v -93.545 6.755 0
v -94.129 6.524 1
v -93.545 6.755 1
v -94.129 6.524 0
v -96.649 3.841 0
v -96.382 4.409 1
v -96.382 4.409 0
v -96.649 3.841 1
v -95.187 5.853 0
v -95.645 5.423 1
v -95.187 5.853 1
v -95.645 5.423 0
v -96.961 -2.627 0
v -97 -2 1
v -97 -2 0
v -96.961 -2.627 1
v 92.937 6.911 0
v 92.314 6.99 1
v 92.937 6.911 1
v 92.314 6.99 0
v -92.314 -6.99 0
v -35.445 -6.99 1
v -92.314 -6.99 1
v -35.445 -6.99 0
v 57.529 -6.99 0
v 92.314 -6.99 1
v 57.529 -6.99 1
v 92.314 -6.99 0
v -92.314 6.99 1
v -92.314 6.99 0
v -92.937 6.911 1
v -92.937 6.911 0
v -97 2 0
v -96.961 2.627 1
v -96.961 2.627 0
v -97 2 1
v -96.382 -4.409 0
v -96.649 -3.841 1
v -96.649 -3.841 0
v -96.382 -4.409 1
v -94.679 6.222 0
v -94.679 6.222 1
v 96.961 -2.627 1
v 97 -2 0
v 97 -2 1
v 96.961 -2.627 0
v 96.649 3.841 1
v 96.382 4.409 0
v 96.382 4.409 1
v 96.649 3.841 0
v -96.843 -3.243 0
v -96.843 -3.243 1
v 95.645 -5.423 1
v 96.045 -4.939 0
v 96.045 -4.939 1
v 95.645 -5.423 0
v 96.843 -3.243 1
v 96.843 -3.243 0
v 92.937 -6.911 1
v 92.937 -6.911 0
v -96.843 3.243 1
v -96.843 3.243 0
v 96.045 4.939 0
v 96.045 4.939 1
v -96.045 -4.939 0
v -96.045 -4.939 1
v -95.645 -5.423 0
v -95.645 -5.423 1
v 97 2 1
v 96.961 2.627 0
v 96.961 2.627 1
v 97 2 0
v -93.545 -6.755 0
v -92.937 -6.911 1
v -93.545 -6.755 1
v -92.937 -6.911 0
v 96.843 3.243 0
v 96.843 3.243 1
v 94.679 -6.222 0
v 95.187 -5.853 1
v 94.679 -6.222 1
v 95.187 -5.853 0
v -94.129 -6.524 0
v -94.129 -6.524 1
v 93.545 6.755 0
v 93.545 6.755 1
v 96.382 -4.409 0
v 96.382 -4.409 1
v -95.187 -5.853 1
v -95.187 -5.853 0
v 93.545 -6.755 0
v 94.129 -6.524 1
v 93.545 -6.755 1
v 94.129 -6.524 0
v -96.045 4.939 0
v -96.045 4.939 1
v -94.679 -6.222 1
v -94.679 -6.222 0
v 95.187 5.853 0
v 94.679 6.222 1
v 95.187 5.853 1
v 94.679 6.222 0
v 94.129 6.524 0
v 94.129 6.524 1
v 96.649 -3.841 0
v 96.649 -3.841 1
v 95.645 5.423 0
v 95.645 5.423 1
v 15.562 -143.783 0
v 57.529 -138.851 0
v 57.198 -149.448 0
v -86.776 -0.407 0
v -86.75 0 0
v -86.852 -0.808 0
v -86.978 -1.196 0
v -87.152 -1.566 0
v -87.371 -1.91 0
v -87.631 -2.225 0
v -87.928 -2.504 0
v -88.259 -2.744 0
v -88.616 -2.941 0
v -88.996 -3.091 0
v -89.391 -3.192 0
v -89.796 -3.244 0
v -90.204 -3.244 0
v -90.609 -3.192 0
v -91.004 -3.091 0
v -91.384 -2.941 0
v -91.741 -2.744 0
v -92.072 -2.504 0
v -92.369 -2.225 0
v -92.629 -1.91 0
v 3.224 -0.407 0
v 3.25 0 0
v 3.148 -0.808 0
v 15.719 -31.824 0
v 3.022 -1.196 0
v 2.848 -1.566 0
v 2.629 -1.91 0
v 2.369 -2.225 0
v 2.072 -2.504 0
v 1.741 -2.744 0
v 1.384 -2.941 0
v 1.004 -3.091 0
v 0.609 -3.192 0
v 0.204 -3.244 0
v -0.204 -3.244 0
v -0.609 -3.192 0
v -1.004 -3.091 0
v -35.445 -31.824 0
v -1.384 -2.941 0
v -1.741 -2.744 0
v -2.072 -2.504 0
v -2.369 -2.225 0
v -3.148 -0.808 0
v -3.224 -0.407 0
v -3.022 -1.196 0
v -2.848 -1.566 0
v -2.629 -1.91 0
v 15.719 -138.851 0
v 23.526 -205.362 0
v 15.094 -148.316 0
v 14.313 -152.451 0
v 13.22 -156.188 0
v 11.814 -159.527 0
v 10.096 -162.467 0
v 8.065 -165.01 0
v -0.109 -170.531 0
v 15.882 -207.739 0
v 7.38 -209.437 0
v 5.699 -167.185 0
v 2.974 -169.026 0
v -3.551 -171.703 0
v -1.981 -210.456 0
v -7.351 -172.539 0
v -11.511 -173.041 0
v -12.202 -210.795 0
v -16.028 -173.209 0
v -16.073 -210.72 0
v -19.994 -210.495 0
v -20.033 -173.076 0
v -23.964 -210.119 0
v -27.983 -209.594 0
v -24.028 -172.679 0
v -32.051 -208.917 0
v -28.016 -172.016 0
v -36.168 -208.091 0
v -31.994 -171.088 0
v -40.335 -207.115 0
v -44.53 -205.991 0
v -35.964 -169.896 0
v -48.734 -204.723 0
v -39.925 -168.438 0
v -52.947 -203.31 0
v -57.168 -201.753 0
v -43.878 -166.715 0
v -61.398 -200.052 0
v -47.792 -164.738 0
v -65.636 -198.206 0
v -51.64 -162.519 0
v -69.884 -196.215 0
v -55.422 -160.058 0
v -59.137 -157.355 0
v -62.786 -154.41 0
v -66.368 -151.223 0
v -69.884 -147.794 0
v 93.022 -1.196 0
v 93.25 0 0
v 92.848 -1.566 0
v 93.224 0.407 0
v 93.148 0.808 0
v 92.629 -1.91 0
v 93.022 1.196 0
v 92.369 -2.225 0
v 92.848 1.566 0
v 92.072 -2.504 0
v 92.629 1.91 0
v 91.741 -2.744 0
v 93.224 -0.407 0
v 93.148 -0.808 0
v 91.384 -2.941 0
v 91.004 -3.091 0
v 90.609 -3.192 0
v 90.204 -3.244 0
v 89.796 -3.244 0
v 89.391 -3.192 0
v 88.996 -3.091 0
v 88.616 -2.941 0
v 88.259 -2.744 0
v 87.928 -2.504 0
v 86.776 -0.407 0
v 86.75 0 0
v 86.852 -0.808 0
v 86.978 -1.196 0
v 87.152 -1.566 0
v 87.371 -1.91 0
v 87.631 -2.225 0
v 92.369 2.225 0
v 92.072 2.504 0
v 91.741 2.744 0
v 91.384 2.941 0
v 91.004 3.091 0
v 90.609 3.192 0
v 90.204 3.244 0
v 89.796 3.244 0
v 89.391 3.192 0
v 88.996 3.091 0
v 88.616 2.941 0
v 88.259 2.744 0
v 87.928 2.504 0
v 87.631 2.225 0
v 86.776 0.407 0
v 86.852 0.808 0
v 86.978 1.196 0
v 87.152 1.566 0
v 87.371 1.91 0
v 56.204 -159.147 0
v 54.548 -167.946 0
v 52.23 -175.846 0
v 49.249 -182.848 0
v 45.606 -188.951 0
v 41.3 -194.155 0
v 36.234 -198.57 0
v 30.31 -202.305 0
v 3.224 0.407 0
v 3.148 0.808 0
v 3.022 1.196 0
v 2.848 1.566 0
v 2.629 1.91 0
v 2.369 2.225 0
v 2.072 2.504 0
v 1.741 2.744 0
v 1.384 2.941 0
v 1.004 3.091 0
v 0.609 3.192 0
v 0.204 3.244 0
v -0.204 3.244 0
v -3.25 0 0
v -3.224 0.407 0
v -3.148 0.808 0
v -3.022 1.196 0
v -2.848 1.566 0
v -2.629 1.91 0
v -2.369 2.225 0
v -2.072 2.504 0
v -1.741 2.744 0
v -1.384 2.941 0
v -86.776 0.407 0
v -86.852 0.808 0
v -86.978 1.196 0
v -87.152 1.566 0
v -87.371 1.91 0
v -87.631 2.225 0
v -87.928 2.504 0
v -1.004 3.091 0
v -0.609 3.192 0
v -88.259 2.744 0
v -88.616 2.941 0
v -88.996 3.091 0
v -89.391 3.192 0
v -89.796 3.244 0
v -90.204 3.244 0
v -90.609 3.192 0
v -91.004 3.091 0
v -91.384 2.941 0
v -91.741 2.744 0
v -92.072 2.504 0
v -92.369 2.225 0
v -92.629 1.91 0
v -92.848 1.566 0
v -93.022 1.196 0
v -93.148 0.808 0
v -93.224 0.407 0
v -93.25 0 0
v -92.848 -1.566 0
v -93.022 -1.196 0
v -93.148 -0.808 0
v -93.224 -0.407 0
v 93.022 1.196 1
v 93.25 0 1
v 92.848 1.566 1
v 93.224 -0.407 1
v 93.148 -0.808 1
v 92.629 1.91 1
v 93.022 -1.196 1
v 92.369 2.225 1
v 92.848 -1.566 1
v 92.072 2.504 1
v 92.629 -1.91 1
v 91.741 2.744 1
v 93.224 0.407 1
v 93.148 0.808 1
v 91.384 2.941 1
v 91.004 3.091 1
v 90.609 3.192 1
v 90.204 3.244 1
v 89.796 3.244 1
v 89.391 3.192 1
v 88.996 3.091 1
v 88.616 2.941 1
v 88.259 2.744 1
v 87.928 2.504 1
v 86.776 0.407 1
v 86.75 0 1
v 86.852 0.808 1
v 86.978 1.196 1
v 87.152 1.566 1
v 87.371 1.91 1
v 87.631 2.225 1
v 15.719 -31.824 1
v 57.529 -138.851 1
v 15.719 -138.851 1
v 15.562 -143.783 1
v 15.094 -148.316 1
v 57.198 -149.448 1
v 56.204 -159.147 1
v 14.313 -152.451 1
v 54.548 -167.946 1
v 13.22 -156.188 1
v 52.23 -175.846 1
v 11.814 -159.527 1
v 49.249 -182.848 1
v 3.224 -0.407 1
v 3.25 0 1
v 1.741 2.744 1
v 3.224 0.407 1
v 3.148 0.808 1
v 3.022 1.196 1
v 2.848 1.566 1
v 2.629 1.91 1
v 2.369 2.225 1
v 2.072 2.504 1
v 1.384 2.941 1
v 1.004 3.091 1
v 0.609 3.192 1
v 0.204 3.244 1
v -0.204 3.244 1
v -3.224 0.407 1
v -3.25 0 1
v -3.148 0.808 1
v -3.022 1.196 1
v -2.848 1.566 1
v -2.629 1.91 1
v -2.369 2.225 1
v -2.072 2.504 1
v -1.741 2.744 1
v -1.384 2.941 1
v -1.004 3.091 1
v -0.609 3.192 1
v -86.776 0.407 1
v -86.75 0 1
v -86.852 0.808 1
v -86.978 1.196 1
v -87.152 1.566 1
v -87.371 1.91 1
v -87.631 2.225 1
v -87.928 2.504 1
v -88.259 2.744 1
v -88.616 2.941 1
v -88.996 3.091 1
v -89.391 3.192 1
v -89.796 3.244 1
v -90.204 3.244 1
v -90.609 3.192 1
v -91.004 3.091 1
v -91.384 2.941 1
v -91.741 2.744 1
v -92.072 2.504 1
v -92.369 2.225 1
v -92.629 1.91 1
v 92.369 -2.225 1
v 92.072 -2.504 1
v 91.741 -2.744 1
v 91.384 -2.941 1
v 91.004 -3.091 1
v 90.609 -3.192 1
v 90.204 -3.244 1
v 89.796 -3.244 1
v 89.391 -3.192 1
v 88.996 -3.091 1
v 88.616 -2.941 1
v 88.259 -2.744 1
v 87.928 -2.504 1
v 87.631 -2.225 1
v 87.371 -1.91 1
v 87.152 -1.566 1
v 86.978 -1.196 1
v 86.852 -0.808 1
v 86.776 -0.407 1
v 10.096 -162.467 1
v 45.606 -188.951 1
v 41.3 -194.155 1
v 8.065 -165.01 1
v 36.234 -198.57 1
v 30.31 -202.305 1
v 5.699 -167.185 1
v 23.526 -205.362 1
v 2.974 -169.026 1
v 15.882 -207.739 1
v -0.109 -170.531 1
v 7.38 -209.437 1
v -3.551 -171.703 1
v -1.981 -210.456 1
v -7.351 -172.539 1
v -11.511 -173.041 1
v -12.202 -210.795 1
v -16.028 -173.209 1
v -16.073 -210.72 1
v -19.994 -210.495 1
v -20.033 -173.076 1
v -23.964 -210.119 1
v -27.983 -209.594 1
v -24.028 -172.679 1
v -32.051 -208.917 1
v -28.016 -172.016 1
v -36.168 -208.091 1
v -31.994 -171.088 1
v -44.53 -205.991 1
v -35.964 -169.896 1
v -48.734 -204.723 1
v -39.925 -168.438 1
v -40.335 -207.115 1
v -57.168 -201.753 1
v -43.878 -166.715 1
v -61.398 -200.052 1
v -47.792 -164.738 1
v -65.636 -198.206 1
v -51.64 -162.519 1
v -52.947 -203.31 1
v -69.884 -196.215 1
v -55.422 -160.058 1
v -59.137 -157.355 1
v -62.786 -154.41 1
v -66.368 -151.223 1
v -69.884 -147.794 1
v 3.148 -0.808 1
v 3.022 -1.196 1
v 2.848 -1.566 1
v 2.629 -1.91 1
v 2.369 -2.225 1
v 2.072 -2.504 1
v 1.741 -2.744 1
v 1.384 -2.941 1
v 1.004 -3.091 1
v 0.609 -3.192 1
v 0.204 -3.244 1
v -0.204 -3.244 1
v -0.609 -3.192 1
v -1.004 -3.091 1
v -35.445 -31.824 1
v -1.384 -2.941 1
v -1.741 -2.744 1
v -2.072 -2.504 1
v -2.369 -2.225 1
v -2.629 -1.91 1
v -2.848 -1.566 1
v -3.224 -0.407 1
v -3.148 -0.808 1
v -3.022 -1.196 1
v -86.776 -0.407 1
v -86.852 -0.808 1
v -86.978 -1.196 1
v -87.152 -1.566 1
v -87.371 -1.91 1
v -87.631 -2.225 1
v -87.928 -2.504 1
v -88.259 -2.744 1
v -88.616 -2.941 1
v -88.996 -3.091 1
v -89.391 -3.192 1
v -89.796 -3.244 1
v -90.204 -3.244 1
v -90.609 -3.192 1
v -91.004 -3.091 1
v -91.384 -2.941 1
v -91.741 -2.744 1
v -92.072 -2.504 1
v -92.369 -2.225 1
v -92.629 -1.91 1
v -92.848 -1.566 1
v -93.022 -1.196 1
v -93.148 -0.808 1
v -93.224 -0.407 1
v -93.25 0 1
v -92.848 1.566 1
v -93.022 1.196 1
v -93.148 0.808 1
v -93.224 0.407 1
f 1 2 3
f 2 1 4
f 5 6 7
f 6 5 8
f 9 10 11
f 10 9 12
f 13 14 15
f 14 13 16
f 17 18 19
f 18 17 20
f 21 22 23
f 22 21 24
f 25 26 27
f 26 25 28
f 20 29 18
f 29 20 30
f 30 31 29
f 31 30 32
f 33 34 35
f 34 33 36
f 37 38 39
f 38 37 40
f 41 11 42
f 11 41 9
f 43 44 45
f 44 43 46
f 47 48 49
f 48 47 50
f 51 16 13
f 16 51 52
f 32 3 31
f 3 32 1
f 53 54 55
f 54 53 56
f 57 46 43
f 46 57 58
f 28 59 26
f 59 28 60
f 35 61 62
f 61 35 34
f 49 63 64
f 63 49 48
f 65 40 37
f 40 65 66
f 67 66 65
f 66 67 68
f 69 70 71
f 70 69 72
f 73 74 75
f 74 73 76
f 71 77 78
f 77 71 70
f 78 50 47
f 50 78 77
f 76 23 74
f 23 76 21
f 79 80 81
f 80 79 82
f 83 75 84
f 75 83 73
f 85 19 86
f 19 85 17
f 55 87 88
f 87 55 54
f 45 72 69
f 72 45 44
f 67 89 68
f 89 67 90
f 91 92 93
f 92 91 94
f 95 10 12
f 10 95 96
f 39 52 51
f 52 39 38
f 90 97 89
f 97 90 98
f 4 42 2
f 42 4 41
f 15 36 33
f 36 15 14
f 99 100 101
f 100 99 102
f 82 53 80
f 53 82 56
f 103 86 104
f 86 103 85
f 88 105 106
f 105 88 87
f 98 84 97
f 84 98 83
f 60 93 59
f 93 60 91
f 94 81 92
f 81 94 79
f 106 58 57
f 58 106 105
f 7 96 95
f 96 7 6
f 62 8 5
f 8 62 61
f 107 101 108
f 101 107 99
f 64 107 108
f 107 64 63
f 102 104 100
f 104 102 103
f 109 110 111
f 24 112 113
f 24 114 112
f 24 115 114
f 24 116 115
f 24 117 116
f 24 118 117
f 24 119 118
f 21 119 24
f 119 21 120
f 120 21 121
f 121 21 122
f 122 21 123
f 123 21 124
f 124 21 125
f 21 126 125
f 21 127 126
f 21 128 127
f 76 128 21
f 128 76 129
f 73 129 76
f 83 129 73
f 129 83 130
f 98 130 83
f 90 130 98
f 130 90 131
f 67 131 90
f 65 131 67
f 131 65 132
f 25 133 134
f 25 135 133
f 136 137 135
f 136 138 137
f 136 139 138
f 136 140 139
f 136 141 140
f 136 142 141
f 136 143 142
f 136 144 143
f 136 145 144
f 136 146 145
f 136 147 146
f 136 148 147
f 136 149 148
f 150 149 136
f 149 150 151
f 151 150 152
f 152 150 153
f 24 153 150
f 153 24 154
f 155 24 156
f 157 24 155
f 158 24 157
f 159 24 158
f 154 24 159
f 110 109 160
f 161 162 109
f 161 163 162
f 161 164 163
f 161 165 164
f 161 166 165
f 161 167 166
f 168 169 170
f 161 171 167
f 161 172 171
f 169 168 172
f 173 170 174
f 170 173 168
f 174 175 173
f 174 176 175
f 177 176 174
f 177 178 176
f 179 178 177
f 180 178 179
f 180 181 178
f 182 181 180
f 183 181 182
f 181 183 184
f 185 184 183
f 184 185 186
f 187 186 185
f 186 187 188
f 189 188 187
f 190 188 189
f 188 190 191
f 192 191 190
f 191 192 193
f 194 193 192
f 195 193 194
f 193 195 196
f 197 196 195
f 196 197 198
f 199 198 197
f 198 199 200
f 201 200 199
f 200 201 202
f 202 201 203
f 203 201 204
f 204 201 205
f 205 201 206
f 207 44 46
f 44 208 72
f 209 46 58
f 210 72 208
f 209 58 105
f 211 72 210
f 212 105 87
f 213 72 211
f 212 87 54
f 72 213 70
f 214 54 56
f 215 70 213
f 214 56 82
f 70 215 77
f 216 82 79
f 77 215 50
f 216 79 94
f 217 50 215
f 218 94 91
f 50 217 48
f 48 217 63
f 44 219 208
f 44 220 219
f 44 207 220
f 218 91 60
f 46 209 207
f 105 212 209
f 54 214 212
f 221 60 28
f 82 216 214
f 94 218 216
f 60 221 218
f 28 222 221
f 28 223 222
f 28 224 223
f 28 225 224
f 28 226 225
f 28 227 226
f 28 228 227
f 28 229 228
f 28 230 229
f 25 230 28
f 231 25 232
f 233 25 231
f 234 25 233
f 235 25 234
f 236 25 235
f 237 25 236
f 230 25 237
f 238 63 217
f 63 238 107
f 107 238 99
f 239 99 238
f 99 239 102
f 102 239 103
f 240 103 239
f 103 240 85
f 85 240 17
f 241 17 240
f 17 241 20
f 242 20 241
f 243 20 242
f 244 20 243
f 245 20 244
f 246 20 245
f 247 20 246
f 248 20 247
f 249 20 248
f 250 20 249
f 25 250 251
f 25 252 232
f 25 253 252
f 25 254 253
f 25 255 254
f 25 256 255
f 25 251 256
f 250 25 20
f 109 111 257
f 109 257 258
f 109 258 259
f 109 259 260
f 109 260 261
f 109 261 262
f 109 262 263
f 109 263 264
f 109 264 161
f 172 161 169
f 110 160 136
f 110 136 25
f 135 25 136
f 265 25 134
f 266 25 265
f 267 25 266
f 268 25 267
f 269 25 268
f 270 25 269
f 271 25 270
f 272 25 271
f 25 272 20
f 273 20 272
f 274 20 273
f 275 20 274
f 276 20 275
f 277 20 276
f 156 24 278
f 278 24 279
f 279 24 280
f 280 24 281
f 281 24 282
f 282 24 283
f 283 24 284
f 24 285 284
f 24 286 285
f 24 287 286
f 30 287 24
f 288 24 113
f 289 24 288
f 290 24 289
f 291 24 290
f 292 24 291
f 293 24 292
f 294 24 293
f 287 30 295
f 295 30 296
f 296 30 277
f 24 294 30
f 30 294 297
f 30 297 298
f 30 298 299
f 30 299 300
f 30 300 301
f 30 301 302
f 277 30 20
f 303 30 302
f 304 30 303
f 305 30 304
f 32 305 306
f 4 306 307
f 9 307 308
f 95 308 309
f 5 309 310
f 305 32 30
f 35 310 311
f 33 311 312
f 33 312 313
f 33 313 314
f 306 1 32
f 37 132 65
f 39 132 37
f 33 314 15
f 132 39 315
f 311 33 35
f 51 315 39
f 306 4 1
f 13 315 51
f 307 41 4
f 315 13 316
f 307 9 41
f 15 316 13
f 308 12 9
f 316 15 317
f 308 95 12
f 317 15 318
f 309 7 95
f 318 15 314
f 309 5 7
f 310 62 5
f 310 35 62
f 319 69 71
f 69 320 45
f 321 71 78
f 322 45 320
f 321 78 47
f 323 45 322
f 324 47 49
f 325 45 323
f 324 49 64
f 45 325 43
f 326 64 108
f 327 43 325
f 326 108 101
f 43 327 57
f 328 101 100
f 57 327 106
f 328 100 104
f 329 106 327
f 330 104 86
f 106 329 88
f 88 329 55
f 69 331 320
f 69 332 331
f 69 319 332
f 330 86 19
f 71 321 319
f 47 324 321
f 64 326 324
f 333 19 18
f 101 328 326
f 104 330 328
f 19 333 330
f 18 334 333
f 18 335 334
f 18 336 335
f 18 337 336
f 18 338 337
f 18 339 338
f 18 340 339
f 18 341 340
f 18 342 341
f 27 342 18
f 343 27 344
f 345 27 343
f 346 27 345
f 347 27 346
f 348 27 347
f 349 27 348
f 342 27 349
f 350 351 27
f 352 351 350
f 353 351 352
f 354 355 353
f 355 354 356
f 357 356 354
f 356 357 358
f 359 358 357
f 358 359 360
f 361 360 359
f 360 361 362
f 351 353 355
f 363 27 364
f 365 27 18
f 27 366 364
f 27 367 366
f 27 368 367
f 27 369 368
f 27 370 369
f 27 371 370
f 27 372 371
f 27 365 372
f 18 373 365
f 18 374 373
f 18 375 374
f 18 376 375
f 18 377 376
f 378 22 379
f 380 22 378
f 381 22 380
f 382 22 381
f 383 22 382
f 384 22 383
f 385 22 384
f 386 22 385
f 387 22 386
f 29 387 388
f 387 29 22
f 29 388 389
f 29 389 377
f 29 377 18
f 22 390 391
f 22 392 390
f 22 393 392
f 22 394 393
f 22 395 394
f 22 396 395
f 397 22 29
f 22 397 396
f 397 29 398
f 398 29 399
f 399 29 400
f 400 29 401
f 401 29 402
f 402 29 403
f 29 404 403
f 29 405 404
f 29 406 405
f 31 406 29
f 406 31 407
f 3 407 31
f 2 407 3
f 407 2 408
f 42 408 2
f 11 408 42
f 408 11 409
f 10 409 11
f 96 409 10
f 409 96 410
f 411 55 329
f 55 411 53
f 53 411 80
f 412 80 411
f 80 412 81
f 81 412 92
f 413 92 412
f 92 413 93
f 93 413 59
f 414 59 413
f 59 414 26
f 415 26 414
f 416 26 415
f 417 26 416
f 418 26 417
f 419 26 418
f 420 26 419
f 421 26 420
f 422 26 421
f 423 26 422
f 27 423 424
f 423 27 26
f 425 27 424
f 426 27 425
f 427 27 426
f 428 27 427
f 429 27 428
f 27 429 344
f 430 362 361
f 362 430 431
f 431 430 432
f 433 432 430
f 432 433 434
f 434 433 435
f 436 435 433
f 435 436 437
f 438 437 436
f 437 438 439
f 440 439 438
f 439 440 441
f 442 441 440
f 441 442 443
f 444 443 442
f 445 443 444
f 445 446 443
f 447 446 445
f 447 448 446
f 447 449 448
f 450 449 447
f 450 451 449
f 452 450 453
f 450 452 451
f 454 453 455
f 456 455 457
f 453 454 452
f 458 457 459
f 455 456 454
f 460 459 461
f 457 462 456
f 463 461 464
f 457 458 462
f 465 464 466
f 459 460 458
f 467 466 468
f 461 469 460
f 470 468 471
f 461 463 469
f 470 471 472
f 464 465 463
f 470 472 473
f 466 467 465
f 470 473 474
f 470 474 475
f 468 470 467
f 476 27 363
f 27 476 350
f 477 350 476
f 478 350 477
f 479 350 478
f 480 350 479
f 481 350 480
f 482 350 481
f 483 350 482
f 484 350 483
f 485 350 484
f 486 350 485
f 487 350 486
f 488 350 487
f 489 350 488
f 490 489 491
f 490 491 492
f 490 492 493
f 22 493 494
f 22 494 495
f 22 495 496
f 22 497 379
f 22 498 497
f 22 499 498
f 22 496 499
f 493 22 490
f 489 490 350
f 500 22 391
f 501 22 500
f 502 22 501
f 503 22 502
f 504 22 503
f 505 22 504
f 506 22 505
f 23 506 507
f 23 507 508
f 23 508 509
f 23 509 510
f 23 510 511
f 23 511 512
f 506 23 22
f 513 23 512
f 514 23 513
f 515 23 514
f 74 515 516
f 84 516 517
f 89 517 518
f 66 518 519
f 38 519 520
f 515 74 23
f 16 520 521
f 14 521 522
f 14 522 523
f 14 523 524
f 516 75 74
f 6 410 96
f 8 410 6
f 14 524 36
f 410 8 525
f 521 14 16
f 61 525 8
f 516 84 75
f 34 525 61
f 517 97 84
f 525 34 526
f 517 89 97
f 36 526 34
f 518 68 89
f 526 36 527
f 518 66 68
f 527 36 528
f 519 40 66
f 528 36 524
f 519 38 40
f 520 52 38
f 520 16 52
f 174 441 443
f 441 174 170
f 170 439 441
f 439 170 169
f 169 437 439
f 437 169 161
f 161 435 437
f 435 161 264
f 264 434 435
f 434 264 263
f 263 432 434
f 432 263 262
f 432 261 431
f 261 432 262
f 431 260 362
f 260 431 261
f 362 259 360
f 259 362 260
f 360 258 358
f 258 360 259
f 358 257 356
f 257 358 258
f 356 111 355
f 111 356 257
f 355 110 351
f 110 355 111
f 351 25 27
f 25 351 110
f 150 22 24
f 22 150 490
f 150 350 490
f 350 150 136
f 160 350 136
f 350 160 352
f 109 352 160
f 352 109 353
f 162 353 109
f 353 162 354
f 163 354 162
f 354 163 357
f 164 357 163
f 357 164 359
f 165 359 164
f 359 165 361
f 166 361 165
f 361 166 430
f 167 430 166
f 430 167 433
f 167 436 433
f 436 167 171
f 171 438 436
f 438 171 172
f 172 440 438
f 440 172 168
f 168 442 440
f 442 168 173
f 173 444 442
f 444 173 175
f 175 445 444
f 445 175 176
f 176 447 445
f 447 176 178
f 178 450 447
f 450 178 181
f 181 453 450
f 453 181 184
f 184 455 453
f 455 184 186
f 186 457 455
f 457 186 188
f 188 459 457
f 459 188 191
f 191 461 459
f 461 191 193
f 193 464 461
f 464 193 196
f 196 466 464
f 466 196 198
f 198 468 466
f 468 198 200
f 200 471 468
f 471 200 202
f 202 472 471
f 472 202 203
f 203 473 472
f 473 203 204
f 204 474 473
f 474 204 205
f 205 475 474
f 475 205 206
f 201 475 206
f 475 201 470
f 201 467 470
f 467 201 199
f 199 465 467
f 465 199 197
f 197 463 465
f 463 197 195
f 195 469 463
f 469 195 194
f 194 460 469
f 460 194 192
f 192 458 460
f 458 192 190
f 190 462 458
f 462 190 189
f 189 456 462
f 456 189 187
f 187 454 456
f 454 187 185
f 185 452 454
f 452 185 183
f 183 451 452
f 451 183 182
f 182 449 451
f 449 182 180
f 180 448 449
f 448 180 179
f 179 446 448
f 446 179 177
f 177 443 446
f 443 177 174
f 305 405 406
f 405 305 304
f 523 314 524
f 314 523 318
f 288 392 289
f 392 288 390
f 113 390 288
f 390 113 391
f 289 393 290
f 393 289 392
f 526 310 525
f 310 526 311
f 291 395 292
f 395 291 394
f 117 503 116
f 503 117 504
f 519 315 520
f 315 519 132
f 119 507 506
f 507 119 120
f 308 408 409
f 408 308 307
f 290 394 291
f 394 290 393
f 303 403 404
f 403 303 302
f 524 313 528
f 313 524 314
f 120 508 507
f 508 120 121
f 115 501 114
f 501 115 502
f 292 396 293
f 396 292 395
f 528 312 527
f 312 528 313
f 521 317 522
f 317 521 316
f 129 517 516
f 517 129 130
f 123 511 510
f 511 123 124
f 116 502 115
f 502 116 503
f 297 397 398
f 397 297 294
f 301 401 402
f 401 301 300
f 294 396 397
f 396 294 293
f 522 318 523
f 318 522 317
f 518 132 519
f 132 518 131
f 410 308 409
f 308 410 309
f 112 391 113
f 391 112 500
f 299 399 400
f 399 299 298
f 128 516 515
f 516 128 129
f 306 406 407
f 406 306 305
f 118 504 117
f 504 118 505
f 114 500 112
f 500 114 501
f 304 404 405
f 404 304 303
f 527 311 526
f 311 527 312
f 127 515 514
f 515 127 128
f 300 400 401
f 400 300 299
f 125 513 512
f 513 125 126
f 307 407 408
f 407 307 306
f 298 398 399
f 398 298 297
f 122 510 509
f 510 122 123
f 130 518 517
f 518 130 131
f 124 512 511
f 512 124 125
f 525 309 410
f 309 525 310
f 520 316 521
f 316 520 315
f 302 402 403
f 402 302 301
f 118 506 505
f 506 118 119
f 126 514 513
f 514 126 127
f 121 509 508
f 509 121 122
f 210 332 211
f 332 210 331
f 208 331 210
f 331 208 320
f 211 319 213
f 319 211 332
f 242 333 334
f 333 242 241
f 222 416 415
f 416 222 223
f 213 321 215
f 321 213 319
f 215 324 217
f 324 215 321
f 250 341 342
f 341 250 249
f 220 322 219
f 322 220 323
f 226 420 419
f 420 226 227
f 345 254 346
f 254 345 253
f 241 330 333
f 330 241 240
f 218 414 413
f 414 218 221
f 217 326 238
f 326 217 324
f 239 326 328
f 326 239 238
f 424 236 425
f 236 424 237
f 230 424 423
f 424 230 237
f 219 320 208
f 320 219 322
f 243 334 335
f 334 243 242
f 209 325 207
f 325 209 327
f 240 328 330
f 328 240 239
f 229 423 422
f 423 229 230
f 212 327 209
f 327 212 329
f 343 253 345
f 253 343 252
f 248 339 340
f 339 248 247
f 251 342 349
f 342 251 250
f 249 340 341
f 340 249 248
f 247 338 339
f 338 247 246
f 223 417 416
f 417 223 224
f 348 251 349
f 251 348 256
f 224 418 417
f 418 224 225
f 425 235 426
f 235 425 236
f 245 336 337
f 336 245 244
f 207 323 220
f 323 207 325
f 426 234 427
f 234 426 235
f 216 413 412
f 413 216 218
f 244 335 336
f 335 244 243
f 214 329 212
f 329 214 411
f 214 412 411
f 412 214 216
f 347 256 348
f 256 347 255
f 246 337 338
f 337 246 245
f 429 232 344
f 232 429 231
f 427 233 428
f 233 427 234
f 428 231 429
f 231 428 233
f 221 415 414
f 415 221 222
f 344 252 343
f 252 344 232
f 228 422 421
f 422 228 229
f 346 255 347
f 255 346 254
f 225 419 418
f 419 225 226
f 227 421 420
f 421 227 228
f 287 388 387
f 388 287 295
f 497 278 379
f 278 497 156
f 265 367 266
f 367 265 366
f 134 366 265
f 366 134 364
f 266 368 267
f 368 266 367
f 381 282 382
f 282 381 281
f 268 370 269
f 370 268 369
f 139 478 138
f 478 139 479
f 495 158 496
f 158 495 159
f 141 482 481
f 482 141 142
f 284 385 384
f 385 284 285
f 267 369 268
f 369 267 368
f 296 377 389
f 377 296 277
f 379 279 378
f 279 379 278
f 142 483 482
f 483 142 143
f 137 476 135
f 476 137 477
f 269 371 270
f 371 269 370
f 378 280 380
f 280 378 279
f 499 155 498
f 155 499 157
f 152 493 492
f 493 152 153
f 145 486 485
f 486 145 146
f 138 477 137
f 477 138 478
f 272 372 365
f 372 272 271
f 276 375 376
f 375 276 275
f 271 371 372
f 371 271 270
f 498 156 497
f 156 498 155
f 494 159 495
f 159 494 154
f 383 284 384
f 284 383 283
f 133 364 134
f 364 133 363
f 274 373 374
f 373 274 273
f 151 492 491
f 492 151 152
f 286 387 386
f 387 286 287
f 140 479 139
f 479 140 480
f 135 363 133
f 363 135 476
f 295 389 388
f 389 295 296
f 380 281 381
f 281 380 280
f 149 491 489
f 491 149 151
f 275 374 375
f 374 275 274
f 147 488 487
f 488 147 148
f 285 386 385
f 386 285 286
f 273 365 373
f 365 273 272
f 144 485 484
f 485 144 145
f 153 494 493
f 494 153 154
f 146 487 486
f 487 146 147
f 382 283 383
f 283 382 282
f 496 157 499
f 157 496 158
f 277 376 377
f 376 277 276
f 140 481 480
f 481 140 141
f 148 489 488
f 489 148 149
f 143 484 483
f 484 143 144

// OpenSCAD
$fn = 50;


difference() {
	union() {
		translate(v = [0, 0, 0]) {
			rotate(a = [0, 0, 0]) {
				hull() {
					translate(v = [-92.0000000000, 2.0000000000, 0]) {
						rotate(a = [0, 0, 0]) {
							translate(v = [0, 0, 0]) {
								rotate(a = [0, 0, 0]) {
									cylinder(h = 1, r = 5);
								}
							}
						}
					}
					translate(v = [92.0000000000, 2.0000000000, 0]) {
						rotate(a = [0, 0, 0]) {
							translate(v = [0, 0, 0]) {
								rotate(a = [0, 0, 0]) {
									cylinder(h = 1, r = 5);
								}
							}
						}
					}
					translate(v = [-92.0000000000, -2.0000000000, 0]) {
						rotate(a = [0, 0, 0]) {
							translate(v = [0, 0, 0]) {
								rotate(a = [0, 0, 0]) {
									cylinder(h = 1, r = 5);
								}
							}
						}
					}
					translate(v = [92.0000000000, -2.0000000000, 0]) {
						rotate(a = [0, 0, 0]) {
							translate(v = [0, 0, 0]) {
								rotate(a = [0, 0, 0]) {
									cylinder(h = 1, r = 5);
								}
							}
						}
					}
				}
			}
		}
		translate(v = [0, 0, 0]) {
			rotate(a = [0, 0, 0]) {
				linear_extrude(height = 1) {
					text(font = "DejaVu Sans Mono:style=Bold", halign = "center", size = 209.0000000000, text = "J", valign = "top");
				}
			}
		}
	}
	union() {
		translate(v = [-90.0000000000, 0.0000000000, -125.0000000000]) {
			rotate(a = [0, 0, 0]) {
				cylinder(h = 250, r = 3.2500000000);
			}
		}
		translate(v = [90.0000000000, 0.0000000000, -125.0000000000]) {
			rotate(a = [0, 0, 0]) {
				cylinder(h = 250, r = 3.2500000000);
			}
		}
		translate(v = [90.0000000000, 0.0000000000, -125.0000000000]) {
			rotate(a = [0, 0, 0]) {
				cylinder(h = 250, r = 3.2500000000);
			}
		}
		translate(v = [0, 0, -125.0000000000]) {
			rotate(a = [0, 0, 0]) {
				cylinder(h = 250, r = 3.2500000000);
			}
		}
	}
}
